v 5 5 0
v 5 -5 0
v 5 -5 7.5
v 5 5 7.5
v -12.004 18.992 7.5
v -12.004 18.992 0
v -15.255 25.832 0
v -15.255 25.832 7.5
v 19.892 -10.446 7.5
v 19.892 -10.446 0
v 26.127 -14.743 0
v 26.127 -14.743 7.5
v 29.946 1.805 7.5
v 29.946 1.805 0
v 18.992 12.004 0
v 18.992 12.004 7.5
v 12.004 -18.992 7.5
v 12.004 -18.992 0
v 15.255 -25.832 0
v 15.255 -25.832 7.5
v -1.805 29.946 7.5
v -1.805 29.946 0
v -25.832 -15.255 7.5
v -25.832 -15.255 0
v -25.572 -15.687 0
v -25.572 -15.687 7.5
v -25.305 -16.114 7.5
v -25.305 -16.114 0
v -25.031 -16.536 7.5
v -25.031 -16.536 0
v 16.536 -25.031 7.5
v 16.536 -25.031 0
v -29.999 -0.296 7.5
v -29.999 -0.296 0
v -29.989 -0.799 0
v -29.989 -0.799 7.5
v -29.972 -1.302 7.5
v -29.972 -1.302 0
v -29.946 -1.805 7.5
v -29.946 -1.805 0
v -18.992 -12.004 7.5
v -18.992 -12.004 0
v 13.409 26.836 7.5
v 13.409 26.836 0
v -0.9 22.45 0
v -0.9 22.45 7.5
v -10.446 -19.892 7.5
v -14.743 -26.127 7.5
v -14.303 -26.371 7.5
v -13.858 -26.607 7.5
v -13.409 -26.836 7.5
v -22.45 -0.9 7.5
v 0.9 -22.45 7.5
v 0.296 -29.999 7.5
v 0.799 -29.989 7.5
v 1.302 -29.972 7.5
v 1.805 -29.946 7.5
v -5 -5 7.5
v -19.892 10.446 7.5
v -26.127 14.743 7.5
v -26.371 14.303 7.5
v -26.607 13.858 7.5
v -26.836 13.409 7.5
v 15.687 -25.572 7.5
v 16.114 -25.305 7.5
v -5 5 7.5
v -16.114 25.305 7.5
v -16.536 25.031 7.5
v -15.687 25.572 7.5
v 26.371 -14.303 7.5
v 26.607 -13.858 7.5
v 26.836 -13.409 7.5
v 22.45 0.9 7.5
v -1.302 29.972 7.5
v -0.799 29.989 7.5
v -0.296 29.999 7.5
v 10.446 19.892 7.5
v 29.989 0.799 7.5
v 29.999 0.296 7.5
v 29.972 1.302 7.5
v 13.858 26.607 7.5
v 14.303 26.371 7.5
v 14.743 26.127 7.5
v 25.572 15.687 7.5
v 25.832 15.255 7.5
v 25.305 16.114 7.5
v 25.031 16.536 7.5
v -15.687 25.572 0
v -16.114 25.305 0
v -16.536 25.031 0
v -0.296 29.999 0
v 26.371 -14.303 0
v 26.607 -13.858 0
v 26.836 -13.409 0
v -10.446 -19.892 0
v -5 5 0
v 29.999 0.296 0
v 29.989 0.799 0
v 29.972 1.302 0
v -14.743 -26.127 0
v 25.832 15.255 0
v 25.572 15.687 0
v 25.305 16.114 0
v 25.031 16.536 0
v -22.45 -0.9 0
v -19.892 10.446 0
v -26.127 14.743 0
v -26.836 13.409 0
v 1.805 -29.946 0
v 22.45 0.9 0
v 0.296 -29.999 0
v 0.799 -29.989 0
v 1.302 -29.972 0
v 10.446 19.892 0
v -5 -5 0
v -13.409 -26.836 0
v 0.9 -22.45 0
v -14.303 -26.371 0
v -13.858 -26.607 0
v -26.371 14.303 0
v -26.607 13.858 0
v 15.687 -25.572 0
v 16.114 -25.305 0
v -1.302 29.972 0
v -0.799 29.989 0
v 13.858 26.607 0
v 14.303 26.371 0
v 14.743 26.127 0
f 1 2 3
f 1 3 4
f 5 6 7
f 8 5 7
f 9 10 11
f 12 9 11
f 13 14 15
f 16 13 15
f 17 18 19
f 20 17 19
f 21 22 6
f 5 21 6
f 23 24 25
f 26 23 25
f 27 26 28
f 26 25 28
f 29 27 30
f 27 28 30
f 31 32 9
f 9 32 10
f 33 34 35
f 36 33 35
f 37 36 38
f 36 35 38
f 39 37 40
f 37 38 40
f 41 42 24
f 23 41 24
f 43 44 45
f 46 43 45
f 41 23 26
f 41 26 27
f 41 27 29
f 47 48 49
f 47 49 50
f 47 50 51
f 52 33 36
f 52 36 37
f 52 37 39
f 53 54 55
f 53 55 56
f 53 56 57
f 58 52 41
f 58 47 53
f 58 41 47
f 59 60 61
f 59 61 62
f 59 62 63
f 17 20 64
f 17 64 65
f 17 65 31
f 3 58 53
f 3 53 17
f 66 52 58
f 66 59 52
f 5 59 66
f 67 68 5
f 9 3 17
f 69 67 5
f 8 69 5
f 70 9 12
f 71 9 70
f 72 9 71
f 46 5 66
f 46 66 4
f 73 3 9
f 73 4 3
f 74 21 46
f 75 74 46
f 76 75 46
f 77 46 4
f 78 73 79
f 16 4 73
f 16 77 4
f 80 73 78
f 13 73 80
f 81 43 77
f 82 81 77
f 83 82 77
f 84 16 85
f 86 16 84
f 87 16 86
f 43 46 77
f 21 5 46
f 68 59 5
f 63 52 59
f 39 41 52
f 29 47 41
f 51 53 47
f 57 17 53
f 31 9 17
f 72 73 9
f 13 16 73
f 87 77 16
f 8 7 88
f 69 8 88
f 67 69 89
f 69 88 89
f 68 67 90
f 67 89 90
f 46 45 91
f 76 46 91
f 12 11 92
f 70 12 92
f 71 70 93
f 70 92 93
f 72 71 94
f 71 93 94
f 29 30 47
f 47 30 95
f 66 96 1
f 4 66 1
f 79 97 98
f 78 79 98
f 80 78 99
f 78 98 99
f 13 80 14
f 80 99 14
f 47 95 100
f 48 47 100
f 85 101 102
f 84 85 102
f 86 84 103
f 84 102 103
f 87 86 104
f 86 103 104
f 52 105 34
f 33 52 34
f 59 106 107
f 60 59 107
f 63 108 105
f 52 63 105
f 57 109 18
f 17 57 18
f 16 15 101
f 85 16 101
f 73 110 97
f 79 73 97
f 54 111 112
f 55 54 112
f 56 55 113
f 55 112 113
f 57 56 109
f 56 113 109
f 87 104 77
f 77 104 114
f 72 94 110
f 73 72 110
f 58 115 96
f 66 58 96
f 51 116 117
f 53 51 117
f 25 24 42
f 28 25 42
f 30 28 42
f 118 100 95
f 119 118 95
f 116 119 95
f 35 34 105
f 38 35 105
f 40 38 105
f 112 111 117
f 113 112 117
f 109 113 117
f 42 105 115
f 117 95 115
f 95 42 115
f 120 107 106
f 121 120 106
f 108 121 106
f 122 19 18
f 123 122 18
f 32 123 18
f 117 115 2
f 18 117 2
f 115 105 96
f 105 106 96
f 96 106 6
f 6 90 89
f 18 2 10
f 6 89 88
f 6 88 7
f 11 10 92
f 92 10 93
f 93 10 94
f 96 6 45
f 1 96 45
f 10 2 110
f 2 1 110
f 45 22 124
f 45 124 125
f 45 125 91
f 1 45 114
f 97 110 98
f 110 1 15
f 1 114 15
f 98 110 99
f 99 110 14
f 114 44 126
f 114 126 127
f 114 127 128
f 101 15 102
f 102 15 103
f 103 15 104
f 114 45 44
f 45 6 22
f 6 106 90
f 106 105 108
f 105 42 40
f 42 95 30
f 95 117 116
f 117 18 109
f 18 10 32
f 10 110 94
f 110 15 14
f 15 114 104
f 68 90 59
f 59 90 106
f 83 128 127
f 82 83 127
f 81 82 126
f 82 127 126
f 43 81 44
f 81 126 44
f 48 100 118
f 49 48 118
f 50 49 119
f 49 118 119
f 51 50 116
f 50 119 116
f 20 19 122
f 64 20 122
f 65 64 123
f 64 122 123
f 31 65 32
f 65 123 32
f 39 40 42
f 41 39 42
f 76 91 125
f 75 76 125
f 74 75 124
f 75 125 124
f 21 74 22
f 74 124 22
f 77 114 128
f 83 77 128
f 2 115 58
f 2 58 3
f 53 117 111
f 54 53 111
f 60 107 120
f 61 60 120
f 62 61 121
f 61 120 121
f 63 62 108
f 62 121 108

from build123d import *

# Parameters (mm, degrees)
SCHIZZO1_W                   = 10
SCHIZZO1_H                   = 10
ESTRUSIONE_ESTRUSIONE1_DEPTH = 7.5


with BuildPart() as part:
    # Schizzo1 → Estrusione-Estrusione1 (new body)
    with BuildSketch(Plane.XY):
        with BuildLine():
            Line((13.409429202, 26.836303927), (-0.9, 22.45))
            Line((-0.9, 22.45), (-0.295575686, 29.998543882))
            ThreePointArc((-0.295575686, 29.998543882), (-1.050743721, 29.981593314), (-1.805245625, 29.945635546))
            Line((-1.805245625, 29.945635546), (-12.004422863, 18.992270315))
            Line((-12.004422863, 18.992270315), (-15.255247993, 25.831713235))
            ThreePointArc((-15.255247993, 25.831713235), (-15.900767412, 25.439449595), (-16.536206344, 25.031058303))
            Line((-16.536206344, 25.031058303), (-19.892270315, 10.445577137))
            Line((-19.892270315, 10.445577137), (-26.127288921, 14.743295888))
            ThreePointArc((-26.127288921, 14.743295888), (-26.490193316, 14.080825902), (-26.836303927, 13.409429202))
            Line((-26.836303927, 13.409429202), (-22.45, -0.9))
            Line((-22.45, -0.9), (-29.998543882, -0.295575686))
            ThreePointArc((-29.998543882, -0.295575686), (-29.981593314, -1.050743721), (-29.945635546, -1.805245625))
            Line((-29.945635546, -1.805245625), (-18.992270315, -12.004422863))
            Line((-18.992270315, -12.004422863), (-25.831713235, -15.255247993))
            ThreePointArc((-25.831713235, -15.255247993), (-25.439449595, -15.900767412), (-25.031058303, -16.536206344))
            Line((-25.031058303, -16.536206344), (-10.445577137, -19.892270315))
            Line((-10.445577137, -19.892270315), (-14.743295888, -26.127288921))
            ThreePointArc((-14.743295888, -26.127288921), (-14.080825902, -26.490193316), (-13.409429202, -26.836303927))
            Line((-13.409429202, -26.836303927), (0.9, -22.45))
            Line((0.9, -22.45), (0.295575686, -29.998543882))
            ThreePointArc((0.295575686, -29.998543882), (1.050743721, -29.981593314), (1.805245625, -29.945635546))
            Line((1.805245625, -29.945635546), (12.004422863, -18.992270315))
            Line((12.004422863, -18.992270315), (15.255247993, -25.831713235))
            ThreePointArc((15.255247993, -25.831713235), (15.900767412, -25.439449595), (16.536206344, -25.031058303))
            Line((16.536206344, -25.031058303), (19.892270315, -10.445577137))
            Line((19.892270315, -10.445577137), (26.127288921, -14.743295888))
            ThreePointArc((26.127288921, -14.743295888), (26.490193316, -14.080825902), (26.836303927, -13.409429202))
            Line((26.836303927, -13.409429202), (22.45, 0.9))
            Line((22.45, 0.9), (29.998543882, 0.295575686))
            ThreePointArc((29.998543882, 0.295575686), (29.981593314, 1.050743721), (29.945635546, 1.805245625))
            Line((29.945635546, 1.805245625), (18.992270315, 12.004422863))
            Line((18.992270315, 12.004422863), (25.831713235, 15.255247993))
            ThreePointArc((25.831713235, 15.255247993), (25.439449595, 15.900767412), (25.031058303, 16.536206344))
            Line((25.031058303, 16.536206344), (10.445577137, 19.892270315))
            Line((10.445577137, 19.892270315), (14.743295888, 26.127288921))
            ThreePointArc((14.743295888, 26.127288921), (14.080825902, 26.490193316), (13.409429202, 26.836303927))
        make_face()
        Rectangle(SCHIZZO1_W, SCHIZZO1_H, mode=Mode.SUBTRACT)
    extrude(amount=ESTRUSIONE_ESTRUSIONE1_DEPTH)


solid = part.part
